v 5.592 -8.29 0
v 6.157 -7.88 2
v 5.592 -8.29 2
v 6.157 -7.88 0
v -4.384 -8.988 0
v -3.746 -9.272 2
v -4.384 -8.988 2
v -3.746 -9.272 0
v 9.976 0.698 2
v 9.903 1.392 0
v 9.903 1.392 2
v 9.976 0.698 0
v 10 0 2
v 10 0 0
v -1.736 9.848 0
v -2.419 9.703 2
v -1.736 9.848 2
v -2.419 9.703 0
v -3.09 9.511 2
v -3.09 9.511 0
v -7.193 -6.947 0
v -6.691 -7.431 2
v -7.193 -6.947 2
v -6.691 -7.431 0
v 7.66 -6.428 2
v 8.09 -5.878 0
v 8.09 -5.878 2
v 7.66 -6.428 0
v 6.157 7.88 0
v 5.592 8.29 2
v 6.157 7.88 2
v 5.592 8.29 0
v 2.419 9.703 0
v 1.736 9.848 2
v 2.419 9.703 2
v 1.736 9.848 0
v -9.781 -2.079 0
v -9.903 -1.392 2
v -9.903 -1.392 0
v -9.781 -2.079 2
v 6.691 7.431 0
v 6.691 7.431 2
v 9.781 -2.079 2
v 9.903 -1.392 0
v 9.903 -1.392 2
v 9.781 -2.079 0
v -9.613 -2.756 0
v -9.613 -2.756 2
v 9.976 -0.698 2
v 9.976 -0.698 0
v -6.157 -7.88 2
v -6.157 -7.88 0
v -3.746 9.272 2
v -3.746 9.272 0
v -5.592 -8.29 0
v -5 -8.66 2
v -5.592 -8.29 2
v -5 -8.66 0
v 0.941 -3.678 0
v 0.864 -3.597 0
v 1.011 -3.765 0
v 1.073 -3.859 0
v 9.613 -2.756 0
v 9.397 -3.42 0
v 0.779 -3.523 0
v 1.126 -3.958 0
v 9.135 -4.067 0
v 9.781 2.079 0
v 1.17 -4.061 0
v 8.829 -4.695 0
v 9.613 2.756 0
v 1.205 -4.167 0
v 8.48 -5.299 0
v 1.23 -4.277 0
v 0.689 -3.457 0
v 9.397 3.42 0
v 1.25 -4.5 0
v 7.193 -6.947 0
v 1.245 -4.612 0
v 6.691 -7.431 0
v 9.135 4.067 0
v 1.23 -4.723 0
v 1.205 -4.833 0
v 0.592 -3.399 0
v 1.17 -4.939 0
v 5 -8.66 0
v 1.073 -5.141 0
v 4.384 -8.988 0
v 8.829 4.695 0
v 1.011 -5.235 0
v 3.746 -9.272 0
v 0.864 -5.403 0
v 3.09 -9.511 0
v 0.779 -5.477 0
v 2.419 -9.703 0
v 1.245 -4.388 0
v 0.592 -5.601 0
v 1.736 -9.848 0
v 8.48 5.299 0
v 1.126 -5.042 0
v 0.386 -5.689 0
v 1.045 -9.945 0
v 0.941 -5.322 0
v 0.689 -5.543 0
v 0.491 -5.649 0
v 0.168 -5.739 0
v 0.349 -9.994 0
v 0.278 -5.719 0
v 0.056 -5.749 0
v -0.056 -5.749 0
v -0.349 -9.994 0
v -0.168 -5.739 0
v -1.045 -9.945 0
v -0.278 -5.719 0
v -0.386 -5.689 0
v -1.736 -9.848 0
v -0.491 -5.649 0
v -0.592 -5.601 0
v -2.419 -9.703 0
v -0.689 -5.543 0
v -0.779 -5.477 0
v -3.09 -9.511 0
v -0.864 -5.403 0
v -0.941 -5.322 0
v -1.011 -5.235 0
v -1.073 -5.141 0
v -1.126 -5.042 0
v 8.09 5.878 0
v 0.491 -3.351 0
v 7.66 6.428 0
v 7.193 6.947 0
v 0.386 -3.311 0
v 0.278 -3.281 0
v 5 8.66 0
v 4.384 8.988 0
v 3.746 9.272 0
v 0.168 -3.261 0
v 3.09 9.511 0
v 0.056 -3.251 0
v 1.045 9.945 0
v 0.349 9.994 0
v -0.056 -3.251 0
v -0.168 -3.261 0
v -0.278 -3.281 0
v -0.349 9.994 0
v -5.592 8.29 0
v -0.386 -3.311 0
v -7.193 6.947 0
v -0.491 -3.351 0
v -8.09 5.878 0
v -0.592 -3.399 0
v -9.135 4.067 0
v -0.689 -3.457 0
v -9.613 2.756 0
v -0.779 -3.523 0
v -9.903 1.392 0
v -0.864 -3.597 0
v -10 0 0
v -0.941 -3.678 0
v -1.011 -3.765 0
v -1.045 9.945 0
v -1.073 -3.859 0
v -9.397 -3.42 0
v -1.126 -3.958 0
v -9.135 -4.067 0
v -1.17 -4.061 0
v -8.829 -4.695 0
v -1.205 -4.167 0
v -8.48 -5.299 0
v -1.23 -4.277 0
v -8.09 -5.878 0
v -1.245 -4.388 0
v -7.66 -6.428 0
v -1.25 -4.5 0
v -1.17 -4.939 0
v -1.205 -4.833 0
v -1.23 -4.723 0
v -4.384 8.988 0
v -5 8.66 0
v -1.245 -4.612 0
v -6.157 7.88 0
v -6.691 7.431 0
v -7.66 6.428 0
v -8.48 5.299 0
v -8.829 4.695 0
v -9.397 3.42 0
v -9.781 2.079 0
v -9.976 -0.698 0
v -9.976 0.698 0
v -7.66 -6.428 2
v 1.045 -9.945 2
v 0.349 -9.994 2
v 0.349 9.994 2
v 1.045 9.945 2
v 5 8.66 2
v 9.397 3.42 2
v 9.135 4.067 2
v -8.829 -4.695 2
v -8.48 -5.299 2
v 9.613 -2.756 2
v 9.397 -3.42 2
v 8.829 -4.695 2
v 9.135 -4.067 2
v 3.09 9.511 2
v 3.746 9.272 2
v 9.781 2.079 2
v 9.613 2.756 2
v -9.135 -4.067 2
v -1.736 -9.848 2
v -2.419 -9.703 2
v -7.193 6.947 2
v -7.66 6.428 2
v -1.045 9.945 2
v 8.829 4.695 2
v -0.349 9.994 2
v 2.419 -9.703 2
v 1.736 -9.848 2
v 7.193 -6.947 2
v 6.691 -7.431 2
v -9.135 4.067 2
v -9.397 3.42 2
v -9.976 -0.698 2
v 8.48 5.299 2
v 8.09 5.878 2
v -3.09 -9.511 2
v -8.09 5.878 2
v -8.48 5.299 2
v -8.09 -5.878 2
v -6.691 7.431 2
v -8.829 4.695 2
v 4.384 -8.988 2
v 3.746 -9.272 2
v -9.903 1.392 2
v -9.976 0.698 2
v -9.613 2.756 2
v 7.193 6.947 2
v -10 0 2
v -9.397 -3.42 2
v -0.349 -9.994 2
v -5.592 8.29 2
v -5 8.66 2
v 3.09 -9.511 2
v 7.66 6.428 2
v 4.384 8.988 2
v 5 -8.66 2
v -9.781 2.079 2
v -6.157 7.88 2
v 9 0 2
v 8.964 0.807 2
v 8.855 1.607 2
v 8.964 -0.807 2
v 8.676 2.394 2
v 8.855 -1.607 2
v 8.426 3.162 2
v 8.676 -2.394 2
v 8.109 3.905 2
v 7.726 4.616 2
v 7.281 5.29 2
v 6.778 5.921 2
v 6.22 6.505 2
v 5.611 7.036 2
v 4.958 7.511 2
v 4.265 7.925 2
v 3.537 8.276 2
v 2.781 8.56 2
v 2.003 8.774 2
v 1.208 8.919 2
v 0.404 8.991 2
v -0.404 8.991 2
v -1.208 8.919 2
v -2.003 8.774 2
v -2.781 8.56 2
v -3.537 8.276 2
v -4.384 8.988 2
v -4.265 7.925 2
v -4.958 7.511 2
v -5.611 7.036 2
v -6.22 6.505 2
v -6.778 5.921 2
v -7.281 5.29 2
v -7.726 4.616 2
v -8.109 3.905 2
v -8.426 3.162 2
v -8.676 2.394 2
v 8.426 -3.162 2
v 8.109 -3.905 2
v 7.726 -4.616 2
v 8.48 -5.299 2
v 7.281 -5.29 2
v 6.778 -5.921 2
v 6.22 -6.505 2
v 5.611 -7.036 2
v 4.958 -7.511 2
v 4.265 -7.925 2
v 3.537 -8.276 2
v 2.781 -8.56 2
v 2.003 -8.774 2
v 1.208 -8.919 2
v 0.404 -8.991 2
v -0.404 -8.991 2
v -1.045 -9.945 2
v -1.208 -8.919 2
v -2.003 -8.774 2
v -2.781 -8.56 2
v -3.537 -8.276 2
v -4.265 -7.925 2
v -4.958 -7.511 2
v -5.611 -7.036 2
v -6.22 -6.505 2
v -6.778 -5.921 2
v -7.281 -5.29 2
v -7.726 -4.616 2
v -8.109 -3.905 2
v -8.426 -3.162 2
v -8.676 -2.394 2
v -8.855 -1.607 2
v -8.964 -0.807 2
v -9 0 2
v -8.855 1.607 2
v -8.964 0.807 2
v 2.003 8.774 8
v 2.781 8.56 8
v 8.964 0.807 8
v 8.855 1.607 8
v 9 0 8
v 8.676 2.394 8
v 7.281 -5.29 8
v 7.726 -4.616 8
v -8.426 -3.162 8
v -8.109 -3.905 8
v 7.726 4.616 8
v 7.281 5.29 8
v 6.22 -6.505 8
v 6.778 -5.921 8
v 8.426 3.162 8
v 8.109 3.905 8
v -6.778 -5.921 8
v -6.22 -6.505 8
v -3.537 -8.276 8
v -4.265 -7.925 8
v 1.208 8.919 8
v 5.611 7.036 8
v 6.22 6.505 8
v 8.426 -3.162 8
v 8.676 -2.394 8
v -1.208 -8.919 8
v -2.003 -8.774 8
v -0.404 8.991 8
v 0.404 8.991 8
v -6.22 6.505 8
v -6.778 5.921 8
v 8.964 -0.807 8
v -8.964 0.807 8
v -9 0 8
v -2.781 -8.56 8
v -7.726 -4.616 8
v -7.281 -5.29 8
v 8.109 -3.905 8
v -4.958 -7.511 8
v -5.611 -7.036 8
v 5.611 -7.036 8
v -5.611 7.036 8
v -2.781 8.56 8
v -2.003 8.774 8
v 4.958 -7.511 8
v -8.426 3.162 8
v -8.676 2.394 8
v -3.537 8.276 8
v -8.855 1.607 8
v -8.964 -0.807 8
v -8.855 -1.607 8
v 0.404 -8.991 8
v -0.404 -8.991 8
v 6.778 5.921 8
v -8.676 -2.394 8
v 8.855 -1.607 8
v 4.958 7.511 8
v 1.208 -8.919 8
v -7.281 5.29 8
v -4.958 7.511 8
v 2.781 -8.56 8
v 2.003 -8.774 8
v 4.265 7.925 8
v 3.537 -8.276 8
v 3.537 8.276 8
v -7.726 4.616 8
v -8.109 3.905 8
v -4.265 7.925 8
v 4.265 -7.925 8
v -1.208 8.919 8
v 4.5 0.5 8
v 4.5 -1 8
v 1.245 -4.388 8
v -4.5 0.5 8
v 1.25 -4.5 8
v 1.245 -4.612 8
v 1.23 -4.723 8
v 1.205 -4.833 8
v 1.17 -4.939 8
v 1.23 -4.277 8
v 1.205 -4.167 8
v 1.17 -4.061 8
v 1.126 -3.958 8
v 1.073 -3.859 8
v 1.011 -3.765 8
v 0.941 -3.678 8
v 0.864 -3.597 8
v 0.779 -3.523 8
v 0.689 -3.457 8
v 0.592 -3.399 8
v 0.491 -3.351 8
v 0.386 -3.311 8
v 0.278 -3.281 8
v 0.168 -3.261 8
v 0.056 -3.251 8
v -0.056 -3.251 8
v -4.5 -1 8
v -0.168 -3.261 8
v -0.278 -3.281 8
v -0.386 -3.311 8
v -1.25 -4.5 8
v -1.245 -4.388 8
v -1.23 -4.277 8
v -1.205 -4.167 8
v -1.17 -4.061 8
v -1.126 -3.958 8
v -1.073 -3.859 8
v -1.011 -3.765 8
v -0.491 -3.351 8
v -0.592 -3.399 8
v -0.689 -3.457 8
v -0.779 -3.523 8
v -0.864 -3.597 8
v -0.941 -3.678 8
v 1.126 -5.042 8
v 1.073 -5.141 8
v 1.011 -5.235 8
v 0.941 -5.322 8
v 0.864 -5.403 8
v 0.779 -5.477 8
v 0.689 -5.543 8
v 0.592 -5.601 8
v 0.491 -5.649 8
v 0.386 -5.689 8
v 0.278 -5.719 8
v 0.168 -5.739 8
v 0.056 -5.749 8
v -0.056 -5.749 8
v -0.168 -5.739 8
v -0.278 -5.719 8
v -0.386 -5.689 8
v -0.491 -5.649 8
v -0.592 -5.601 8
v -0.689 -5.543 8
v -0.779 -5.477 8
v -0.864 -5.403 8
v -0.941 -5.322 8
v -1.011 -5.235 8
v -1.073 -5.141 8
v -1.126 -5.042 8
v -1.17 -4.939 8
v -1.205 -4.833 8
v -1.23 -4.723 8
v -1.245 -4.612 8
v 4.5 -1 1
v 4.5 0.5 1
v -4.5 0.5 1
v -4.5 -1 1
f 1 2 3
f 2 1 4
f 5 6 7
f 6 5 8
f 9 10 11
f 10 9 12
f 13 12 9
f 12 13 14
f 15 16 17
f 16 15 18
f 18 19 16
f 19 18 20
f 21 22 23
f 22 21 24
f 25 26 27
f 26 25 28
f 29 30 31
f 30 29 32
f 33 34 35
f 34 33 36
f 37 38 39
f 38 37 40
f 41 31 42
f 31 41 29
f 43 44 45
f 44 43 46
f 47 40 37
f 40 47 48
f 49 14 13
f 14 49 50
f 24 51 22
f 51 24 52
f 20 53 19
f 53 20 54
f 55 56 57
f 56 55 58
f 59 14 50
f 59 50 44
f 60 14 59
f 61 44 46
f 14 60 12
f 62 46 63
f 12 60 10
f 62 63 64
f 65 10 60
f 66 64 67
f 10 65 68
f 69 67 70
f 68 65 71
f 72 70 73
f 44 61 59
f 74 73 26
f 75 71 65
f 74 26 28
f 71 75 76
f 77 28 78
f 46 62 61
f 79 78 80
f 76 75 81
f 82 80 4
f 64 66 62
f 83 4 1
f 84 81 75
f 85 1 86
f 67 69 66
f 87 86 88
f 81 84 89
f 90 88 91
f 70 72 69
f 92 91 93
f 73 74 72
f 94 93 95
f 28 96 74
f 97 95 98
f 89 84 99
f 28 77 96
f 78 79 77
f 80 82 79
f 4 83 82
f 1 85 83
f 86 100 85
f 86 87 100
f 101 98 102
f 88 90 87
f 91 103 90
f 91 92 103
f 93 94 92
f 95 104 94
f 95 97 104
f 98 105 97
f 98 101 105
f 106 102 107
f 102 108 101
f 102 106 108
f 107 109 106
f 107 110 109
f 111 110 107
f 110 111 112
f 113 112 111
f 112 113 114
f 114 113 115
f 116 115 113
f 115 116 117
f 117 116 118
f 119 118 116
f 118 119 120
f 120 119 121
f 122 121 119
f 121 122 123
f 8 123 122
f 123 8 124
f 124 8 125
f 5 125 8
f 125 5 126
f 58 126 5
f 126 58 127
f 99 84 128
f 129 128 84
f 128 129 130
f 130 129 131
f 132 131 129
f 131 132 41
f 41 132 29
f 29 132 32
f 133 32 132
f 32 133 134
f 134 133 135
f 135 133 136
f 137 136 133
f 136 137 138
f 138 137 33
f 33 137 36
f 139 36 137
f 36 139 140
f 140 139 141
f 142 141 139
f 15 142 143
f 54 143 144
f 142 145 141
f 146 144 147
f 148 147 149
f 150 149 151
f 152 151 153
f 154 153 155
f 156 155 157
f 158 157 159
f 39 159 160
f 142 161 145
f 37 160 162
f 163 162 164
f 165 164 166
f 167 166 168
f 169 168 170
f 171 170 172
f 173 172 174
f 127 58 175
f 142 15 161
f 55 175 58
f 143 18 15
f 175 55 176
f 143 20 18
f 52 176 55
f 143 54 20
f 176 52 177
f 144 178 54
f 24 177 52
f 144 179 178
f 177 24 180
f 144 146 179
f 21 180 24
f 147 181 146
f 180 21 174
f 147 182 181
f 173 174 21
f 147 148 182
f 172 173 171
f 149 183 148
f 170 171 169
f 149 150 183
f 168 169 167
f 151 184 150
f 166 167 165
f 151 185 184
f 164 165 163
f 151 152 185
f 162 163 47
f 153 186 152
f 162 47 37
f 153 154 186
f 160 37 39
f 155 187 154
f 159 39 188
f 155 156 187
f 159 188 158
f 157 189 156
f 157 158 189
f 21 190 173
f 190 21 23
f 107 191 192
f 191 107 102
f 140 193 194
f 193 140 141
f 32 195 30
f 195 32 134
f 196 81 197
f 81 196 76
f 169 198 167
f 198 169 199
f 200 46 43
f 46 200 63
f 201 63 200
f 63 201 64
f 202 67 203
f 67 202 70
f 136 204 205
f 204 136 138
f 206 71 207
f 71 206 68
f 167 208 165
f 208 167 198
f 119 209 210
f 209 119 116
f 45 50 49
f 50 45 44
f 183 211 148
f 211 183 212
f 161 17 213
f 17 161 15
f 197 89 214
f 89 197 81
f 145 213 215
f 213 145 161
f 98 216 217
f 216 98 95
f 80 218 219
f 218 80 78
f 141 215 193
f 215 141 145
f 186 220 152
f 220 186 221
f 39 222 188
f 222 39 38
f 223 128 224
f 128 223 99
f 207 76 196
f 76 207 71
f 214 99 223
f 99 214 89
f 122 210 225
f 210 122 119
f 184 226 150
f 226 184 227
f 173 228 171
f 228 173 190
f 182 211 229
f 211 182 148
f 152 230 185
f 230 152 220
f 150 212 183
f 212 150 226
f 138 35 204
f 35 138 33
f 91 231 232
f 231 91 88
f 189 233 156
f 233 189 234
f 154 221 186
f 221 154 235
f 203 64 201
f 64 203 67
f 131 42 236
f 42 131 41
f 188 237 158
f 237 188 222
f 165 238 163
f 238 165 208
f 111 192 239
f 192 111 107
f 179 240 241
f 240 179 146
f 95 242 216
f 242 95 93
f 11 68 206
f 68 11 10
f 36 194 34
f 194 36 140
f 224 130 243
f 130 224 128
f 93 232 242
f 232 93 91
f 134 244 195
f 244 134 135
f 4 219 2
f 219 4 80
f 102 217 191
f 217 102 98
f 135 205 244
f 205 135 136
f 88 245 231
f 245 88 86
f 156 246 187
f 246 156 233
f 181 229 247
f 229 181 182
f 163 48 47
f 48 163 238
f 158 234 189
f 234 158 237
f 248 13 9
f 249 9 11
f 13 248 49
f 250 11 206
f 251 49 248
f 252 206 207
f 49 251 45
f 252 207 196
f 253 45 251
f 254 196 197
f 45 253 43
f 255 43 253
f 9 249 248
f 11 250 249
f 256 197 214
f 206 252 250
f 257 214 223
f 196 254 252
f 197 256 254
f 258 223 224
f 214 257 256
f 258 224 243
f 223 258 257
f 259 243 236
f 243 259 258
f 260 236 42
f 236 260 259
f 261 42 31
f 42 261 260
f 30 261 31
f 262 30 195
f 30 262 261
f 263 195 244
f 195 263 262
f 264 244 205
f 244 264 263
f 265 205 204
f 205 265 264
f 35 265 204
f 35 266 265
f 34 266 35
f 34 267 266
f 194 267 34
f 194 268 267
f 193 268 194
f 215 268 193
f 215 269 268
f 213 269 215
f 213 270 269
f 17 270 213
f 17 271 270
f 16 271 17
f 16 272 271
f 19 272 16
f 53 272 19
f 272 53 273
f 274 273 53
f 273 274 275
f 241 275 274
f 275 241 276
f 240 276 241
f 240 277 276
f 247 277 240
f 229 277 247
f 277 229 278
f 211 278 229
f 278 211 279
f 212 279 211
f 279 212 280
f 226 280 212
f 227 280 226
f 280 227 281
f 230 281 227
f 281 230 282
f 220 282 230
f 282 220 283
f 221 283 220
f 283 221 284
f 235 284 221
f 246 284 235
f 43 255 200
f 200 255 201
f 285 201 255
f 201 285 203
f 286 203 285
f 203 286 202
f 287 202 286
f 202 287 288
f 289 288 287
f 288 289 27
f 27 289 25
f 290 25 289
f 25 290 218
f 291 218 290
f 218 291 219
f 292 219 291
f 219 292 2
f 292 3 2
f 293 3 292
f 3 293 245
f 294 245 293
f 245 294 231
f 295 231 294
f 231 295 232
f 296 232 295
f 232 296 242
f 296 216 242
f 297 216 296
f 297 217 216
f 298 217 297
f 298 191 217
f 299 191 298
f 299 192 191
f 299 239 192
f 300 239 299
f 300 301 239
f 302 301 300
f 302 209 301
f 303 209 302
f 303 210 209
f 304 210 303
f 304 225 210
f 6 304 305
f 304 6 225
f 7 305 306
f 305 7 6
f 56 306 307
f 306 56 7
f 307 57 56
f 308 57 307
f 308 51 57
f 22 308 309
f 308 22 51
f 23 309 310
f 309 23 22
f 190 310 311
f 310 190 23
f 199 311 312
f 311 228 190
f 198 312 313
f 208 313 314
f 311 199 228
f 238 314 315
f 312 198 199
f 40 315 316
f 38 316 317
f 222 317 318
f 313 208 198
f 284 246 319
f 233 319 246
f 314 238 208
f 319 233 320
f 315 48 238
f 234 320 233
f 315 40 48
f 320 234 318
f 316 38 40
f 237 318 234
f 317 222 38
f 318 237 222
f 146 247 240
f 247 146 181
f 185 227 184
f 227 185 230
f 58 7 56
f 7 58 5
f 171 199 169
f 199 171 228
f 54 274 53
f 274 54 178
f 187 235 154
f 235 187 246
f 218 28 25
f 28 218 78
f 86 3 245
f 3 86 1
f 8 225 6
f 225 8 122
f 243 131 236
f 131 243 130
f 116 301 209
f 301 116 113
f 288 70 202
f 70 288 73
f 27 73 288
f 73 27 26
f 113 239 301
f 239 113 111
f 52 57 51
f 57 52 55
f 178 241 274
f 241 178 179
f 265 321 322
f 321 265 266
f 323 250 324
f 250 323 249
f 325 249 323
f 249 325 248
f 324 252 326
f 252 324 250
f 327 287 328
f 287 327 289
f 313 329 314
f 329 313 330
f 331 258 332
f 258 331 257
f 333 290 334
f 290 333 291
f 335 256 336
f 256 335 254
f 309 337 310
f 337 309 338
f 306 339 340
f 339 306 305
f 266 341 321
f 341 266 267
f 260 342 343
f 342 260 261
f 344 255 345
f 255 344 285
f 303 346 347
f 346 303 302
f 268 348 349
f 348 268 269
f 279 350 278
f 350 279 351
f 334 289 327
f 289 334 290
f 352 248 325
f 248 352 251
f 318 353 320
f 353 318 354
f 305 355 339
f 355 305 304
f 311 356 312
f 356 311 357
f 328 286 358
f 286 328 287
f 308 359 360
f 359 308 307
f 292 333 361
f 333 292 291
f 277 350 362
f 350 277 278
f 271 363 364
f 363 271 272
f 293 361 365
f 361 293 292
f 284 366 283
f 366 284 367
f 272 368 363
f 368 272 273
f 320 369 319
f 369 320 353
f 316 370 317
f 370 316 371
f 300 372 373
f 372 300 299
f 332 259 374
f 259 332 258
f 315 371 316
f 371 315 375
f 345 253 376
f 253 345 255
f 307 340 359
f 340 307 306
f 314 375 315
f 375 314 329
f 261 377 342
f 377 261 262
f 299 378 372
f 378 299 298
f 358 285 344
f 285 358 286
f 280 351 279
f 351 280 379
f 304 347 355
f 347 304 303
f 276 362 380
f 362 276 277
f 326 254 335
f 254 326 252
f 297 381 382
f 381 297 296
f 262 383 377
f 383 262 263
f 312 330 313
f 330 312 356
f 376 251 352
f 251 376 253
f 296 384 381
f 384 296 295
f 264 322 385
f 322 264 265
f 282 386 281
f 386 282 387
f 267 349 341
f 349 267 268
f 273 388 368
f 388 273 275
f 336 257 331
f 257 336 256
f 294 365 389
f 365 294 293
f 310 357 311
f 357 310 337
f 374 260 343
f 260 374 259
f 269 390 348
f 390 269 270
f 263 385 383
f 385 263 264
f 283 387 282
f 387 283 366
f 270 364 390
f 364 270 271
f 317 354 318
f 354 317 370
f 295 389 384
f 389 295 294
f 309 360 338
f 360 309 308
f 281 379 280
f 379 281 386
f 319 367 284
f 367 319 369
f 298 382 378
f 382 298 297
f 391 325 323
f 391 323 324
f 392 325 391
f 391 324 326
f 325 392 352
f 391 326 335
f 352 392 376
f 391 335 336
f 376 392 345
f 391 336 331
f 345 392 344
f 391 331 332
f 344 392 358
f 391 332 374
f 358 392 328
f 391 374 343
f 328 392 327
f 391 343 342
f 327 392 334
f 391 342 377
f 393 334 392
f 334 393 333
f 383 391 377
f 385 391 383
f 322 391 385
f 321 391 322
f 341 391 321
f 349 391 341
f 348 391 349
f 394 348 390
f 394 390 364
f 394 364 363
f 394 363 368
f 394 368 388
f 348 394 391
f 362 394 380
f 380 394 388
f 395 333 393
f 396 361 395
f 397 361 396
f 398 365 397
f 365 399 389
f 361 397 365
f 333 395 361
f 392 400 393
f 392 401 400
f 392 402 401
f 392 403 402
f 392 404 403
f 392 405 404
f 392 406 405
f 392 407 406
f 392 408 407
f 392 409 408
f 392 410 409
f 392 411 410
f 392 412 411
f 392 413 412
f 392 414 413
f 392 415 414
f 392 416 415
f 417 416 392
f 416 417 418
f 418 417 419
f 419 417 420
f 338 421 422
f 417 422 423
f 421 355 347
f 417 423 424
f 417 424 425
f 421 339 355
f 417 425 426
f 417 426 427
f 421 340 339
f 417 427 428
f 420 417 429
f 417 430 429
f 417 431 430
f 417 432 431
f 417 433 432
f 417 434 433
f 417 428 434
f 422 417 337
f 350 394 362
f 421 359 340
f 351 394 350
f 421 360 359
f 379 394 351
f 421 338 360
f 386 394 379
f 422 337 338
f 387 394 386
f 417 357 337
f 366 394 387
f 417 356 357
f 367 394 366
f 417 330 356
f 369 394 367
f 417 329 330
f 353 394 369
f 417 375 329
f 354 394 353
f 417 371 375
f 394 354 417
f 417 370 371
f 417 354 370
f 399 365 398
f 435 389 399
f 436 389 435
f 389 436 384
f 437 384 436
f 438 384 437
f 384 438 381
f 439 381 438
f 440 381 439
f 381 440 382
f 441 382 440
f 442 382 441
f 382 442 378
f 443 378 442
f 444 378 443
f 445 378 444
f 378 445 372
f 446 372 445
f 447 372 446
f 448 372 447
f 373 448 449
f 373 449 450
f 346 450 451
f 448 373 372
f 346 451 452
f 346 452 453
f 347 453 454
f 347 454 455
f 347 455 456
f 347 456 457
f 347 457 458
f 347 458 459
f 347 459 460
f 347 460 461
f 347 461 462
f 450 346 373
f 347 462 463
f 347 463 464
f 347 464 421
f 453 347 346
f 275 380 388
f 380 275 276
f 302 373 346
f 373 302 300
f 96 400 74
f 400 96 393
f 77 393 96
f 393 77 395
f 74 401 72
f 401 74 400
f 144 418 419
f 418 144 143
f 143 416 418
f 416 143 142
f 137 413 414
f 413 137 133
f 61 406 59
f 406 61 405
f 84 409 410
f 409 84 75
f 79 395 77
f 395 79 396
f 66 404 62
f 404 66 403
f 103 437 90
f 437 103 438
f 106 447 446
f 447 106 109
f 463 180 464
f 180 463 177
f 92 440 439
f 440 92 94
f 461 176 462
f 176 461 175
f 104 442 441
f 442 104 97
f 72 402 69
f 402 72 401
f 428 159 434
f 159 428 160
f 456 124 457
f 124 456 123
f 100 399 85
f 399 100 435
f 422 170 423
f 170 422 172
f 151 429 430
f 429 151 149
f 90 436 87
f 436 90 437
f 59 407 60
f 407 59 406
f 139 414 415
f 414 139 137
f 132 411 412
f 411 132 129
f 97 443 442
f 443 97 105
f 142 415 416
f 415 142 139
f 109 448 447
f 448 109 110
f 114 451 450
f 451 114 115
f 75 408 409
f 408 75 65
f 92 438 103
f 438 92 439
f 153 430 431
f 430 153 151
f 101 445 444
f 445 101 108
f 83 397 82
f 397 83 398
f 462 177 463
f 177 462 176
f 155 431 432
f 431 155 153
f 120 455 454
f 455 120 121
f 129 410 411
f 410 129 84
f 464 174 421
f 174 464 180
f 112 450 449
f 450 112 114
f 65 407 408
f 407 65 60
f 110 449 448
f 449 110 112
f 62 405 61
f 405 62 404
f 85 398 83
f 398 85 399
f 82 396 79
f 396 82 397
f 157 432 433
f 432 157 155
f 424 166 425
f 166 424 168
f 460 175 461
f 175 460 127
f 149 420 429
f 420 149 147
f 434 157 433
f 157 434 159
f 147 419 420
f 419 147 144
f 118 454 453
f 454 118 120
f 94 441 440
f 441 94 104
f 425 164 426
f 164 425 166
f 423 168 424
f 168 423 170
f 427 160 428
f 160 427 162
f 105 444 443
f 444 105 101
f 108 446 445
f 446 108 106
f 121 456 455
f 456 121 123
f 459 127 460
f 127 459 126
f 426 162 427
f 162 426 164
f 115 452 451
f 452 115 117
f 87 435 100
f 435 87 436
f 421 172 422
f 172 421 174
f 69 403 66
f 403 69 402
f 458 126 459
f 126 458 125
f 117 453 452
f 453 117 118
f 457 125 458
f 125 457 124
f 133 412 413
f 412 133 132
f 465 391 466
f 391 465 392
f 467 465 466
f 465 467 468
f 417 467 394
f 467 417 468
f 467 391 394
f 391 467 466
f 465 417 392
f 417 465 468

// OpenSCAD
difference(){
    union(){
    cylinder(d = 20, h = 2, $fn =90);
cylinder(d = 18, h = 8, $fn =70);
    }
translate([0,-4.5,-1])cylinder(d = 2.5, h = 22, $fn =70);
translate([-4.5,-1,1])cube([9,1.5,8]);
}
